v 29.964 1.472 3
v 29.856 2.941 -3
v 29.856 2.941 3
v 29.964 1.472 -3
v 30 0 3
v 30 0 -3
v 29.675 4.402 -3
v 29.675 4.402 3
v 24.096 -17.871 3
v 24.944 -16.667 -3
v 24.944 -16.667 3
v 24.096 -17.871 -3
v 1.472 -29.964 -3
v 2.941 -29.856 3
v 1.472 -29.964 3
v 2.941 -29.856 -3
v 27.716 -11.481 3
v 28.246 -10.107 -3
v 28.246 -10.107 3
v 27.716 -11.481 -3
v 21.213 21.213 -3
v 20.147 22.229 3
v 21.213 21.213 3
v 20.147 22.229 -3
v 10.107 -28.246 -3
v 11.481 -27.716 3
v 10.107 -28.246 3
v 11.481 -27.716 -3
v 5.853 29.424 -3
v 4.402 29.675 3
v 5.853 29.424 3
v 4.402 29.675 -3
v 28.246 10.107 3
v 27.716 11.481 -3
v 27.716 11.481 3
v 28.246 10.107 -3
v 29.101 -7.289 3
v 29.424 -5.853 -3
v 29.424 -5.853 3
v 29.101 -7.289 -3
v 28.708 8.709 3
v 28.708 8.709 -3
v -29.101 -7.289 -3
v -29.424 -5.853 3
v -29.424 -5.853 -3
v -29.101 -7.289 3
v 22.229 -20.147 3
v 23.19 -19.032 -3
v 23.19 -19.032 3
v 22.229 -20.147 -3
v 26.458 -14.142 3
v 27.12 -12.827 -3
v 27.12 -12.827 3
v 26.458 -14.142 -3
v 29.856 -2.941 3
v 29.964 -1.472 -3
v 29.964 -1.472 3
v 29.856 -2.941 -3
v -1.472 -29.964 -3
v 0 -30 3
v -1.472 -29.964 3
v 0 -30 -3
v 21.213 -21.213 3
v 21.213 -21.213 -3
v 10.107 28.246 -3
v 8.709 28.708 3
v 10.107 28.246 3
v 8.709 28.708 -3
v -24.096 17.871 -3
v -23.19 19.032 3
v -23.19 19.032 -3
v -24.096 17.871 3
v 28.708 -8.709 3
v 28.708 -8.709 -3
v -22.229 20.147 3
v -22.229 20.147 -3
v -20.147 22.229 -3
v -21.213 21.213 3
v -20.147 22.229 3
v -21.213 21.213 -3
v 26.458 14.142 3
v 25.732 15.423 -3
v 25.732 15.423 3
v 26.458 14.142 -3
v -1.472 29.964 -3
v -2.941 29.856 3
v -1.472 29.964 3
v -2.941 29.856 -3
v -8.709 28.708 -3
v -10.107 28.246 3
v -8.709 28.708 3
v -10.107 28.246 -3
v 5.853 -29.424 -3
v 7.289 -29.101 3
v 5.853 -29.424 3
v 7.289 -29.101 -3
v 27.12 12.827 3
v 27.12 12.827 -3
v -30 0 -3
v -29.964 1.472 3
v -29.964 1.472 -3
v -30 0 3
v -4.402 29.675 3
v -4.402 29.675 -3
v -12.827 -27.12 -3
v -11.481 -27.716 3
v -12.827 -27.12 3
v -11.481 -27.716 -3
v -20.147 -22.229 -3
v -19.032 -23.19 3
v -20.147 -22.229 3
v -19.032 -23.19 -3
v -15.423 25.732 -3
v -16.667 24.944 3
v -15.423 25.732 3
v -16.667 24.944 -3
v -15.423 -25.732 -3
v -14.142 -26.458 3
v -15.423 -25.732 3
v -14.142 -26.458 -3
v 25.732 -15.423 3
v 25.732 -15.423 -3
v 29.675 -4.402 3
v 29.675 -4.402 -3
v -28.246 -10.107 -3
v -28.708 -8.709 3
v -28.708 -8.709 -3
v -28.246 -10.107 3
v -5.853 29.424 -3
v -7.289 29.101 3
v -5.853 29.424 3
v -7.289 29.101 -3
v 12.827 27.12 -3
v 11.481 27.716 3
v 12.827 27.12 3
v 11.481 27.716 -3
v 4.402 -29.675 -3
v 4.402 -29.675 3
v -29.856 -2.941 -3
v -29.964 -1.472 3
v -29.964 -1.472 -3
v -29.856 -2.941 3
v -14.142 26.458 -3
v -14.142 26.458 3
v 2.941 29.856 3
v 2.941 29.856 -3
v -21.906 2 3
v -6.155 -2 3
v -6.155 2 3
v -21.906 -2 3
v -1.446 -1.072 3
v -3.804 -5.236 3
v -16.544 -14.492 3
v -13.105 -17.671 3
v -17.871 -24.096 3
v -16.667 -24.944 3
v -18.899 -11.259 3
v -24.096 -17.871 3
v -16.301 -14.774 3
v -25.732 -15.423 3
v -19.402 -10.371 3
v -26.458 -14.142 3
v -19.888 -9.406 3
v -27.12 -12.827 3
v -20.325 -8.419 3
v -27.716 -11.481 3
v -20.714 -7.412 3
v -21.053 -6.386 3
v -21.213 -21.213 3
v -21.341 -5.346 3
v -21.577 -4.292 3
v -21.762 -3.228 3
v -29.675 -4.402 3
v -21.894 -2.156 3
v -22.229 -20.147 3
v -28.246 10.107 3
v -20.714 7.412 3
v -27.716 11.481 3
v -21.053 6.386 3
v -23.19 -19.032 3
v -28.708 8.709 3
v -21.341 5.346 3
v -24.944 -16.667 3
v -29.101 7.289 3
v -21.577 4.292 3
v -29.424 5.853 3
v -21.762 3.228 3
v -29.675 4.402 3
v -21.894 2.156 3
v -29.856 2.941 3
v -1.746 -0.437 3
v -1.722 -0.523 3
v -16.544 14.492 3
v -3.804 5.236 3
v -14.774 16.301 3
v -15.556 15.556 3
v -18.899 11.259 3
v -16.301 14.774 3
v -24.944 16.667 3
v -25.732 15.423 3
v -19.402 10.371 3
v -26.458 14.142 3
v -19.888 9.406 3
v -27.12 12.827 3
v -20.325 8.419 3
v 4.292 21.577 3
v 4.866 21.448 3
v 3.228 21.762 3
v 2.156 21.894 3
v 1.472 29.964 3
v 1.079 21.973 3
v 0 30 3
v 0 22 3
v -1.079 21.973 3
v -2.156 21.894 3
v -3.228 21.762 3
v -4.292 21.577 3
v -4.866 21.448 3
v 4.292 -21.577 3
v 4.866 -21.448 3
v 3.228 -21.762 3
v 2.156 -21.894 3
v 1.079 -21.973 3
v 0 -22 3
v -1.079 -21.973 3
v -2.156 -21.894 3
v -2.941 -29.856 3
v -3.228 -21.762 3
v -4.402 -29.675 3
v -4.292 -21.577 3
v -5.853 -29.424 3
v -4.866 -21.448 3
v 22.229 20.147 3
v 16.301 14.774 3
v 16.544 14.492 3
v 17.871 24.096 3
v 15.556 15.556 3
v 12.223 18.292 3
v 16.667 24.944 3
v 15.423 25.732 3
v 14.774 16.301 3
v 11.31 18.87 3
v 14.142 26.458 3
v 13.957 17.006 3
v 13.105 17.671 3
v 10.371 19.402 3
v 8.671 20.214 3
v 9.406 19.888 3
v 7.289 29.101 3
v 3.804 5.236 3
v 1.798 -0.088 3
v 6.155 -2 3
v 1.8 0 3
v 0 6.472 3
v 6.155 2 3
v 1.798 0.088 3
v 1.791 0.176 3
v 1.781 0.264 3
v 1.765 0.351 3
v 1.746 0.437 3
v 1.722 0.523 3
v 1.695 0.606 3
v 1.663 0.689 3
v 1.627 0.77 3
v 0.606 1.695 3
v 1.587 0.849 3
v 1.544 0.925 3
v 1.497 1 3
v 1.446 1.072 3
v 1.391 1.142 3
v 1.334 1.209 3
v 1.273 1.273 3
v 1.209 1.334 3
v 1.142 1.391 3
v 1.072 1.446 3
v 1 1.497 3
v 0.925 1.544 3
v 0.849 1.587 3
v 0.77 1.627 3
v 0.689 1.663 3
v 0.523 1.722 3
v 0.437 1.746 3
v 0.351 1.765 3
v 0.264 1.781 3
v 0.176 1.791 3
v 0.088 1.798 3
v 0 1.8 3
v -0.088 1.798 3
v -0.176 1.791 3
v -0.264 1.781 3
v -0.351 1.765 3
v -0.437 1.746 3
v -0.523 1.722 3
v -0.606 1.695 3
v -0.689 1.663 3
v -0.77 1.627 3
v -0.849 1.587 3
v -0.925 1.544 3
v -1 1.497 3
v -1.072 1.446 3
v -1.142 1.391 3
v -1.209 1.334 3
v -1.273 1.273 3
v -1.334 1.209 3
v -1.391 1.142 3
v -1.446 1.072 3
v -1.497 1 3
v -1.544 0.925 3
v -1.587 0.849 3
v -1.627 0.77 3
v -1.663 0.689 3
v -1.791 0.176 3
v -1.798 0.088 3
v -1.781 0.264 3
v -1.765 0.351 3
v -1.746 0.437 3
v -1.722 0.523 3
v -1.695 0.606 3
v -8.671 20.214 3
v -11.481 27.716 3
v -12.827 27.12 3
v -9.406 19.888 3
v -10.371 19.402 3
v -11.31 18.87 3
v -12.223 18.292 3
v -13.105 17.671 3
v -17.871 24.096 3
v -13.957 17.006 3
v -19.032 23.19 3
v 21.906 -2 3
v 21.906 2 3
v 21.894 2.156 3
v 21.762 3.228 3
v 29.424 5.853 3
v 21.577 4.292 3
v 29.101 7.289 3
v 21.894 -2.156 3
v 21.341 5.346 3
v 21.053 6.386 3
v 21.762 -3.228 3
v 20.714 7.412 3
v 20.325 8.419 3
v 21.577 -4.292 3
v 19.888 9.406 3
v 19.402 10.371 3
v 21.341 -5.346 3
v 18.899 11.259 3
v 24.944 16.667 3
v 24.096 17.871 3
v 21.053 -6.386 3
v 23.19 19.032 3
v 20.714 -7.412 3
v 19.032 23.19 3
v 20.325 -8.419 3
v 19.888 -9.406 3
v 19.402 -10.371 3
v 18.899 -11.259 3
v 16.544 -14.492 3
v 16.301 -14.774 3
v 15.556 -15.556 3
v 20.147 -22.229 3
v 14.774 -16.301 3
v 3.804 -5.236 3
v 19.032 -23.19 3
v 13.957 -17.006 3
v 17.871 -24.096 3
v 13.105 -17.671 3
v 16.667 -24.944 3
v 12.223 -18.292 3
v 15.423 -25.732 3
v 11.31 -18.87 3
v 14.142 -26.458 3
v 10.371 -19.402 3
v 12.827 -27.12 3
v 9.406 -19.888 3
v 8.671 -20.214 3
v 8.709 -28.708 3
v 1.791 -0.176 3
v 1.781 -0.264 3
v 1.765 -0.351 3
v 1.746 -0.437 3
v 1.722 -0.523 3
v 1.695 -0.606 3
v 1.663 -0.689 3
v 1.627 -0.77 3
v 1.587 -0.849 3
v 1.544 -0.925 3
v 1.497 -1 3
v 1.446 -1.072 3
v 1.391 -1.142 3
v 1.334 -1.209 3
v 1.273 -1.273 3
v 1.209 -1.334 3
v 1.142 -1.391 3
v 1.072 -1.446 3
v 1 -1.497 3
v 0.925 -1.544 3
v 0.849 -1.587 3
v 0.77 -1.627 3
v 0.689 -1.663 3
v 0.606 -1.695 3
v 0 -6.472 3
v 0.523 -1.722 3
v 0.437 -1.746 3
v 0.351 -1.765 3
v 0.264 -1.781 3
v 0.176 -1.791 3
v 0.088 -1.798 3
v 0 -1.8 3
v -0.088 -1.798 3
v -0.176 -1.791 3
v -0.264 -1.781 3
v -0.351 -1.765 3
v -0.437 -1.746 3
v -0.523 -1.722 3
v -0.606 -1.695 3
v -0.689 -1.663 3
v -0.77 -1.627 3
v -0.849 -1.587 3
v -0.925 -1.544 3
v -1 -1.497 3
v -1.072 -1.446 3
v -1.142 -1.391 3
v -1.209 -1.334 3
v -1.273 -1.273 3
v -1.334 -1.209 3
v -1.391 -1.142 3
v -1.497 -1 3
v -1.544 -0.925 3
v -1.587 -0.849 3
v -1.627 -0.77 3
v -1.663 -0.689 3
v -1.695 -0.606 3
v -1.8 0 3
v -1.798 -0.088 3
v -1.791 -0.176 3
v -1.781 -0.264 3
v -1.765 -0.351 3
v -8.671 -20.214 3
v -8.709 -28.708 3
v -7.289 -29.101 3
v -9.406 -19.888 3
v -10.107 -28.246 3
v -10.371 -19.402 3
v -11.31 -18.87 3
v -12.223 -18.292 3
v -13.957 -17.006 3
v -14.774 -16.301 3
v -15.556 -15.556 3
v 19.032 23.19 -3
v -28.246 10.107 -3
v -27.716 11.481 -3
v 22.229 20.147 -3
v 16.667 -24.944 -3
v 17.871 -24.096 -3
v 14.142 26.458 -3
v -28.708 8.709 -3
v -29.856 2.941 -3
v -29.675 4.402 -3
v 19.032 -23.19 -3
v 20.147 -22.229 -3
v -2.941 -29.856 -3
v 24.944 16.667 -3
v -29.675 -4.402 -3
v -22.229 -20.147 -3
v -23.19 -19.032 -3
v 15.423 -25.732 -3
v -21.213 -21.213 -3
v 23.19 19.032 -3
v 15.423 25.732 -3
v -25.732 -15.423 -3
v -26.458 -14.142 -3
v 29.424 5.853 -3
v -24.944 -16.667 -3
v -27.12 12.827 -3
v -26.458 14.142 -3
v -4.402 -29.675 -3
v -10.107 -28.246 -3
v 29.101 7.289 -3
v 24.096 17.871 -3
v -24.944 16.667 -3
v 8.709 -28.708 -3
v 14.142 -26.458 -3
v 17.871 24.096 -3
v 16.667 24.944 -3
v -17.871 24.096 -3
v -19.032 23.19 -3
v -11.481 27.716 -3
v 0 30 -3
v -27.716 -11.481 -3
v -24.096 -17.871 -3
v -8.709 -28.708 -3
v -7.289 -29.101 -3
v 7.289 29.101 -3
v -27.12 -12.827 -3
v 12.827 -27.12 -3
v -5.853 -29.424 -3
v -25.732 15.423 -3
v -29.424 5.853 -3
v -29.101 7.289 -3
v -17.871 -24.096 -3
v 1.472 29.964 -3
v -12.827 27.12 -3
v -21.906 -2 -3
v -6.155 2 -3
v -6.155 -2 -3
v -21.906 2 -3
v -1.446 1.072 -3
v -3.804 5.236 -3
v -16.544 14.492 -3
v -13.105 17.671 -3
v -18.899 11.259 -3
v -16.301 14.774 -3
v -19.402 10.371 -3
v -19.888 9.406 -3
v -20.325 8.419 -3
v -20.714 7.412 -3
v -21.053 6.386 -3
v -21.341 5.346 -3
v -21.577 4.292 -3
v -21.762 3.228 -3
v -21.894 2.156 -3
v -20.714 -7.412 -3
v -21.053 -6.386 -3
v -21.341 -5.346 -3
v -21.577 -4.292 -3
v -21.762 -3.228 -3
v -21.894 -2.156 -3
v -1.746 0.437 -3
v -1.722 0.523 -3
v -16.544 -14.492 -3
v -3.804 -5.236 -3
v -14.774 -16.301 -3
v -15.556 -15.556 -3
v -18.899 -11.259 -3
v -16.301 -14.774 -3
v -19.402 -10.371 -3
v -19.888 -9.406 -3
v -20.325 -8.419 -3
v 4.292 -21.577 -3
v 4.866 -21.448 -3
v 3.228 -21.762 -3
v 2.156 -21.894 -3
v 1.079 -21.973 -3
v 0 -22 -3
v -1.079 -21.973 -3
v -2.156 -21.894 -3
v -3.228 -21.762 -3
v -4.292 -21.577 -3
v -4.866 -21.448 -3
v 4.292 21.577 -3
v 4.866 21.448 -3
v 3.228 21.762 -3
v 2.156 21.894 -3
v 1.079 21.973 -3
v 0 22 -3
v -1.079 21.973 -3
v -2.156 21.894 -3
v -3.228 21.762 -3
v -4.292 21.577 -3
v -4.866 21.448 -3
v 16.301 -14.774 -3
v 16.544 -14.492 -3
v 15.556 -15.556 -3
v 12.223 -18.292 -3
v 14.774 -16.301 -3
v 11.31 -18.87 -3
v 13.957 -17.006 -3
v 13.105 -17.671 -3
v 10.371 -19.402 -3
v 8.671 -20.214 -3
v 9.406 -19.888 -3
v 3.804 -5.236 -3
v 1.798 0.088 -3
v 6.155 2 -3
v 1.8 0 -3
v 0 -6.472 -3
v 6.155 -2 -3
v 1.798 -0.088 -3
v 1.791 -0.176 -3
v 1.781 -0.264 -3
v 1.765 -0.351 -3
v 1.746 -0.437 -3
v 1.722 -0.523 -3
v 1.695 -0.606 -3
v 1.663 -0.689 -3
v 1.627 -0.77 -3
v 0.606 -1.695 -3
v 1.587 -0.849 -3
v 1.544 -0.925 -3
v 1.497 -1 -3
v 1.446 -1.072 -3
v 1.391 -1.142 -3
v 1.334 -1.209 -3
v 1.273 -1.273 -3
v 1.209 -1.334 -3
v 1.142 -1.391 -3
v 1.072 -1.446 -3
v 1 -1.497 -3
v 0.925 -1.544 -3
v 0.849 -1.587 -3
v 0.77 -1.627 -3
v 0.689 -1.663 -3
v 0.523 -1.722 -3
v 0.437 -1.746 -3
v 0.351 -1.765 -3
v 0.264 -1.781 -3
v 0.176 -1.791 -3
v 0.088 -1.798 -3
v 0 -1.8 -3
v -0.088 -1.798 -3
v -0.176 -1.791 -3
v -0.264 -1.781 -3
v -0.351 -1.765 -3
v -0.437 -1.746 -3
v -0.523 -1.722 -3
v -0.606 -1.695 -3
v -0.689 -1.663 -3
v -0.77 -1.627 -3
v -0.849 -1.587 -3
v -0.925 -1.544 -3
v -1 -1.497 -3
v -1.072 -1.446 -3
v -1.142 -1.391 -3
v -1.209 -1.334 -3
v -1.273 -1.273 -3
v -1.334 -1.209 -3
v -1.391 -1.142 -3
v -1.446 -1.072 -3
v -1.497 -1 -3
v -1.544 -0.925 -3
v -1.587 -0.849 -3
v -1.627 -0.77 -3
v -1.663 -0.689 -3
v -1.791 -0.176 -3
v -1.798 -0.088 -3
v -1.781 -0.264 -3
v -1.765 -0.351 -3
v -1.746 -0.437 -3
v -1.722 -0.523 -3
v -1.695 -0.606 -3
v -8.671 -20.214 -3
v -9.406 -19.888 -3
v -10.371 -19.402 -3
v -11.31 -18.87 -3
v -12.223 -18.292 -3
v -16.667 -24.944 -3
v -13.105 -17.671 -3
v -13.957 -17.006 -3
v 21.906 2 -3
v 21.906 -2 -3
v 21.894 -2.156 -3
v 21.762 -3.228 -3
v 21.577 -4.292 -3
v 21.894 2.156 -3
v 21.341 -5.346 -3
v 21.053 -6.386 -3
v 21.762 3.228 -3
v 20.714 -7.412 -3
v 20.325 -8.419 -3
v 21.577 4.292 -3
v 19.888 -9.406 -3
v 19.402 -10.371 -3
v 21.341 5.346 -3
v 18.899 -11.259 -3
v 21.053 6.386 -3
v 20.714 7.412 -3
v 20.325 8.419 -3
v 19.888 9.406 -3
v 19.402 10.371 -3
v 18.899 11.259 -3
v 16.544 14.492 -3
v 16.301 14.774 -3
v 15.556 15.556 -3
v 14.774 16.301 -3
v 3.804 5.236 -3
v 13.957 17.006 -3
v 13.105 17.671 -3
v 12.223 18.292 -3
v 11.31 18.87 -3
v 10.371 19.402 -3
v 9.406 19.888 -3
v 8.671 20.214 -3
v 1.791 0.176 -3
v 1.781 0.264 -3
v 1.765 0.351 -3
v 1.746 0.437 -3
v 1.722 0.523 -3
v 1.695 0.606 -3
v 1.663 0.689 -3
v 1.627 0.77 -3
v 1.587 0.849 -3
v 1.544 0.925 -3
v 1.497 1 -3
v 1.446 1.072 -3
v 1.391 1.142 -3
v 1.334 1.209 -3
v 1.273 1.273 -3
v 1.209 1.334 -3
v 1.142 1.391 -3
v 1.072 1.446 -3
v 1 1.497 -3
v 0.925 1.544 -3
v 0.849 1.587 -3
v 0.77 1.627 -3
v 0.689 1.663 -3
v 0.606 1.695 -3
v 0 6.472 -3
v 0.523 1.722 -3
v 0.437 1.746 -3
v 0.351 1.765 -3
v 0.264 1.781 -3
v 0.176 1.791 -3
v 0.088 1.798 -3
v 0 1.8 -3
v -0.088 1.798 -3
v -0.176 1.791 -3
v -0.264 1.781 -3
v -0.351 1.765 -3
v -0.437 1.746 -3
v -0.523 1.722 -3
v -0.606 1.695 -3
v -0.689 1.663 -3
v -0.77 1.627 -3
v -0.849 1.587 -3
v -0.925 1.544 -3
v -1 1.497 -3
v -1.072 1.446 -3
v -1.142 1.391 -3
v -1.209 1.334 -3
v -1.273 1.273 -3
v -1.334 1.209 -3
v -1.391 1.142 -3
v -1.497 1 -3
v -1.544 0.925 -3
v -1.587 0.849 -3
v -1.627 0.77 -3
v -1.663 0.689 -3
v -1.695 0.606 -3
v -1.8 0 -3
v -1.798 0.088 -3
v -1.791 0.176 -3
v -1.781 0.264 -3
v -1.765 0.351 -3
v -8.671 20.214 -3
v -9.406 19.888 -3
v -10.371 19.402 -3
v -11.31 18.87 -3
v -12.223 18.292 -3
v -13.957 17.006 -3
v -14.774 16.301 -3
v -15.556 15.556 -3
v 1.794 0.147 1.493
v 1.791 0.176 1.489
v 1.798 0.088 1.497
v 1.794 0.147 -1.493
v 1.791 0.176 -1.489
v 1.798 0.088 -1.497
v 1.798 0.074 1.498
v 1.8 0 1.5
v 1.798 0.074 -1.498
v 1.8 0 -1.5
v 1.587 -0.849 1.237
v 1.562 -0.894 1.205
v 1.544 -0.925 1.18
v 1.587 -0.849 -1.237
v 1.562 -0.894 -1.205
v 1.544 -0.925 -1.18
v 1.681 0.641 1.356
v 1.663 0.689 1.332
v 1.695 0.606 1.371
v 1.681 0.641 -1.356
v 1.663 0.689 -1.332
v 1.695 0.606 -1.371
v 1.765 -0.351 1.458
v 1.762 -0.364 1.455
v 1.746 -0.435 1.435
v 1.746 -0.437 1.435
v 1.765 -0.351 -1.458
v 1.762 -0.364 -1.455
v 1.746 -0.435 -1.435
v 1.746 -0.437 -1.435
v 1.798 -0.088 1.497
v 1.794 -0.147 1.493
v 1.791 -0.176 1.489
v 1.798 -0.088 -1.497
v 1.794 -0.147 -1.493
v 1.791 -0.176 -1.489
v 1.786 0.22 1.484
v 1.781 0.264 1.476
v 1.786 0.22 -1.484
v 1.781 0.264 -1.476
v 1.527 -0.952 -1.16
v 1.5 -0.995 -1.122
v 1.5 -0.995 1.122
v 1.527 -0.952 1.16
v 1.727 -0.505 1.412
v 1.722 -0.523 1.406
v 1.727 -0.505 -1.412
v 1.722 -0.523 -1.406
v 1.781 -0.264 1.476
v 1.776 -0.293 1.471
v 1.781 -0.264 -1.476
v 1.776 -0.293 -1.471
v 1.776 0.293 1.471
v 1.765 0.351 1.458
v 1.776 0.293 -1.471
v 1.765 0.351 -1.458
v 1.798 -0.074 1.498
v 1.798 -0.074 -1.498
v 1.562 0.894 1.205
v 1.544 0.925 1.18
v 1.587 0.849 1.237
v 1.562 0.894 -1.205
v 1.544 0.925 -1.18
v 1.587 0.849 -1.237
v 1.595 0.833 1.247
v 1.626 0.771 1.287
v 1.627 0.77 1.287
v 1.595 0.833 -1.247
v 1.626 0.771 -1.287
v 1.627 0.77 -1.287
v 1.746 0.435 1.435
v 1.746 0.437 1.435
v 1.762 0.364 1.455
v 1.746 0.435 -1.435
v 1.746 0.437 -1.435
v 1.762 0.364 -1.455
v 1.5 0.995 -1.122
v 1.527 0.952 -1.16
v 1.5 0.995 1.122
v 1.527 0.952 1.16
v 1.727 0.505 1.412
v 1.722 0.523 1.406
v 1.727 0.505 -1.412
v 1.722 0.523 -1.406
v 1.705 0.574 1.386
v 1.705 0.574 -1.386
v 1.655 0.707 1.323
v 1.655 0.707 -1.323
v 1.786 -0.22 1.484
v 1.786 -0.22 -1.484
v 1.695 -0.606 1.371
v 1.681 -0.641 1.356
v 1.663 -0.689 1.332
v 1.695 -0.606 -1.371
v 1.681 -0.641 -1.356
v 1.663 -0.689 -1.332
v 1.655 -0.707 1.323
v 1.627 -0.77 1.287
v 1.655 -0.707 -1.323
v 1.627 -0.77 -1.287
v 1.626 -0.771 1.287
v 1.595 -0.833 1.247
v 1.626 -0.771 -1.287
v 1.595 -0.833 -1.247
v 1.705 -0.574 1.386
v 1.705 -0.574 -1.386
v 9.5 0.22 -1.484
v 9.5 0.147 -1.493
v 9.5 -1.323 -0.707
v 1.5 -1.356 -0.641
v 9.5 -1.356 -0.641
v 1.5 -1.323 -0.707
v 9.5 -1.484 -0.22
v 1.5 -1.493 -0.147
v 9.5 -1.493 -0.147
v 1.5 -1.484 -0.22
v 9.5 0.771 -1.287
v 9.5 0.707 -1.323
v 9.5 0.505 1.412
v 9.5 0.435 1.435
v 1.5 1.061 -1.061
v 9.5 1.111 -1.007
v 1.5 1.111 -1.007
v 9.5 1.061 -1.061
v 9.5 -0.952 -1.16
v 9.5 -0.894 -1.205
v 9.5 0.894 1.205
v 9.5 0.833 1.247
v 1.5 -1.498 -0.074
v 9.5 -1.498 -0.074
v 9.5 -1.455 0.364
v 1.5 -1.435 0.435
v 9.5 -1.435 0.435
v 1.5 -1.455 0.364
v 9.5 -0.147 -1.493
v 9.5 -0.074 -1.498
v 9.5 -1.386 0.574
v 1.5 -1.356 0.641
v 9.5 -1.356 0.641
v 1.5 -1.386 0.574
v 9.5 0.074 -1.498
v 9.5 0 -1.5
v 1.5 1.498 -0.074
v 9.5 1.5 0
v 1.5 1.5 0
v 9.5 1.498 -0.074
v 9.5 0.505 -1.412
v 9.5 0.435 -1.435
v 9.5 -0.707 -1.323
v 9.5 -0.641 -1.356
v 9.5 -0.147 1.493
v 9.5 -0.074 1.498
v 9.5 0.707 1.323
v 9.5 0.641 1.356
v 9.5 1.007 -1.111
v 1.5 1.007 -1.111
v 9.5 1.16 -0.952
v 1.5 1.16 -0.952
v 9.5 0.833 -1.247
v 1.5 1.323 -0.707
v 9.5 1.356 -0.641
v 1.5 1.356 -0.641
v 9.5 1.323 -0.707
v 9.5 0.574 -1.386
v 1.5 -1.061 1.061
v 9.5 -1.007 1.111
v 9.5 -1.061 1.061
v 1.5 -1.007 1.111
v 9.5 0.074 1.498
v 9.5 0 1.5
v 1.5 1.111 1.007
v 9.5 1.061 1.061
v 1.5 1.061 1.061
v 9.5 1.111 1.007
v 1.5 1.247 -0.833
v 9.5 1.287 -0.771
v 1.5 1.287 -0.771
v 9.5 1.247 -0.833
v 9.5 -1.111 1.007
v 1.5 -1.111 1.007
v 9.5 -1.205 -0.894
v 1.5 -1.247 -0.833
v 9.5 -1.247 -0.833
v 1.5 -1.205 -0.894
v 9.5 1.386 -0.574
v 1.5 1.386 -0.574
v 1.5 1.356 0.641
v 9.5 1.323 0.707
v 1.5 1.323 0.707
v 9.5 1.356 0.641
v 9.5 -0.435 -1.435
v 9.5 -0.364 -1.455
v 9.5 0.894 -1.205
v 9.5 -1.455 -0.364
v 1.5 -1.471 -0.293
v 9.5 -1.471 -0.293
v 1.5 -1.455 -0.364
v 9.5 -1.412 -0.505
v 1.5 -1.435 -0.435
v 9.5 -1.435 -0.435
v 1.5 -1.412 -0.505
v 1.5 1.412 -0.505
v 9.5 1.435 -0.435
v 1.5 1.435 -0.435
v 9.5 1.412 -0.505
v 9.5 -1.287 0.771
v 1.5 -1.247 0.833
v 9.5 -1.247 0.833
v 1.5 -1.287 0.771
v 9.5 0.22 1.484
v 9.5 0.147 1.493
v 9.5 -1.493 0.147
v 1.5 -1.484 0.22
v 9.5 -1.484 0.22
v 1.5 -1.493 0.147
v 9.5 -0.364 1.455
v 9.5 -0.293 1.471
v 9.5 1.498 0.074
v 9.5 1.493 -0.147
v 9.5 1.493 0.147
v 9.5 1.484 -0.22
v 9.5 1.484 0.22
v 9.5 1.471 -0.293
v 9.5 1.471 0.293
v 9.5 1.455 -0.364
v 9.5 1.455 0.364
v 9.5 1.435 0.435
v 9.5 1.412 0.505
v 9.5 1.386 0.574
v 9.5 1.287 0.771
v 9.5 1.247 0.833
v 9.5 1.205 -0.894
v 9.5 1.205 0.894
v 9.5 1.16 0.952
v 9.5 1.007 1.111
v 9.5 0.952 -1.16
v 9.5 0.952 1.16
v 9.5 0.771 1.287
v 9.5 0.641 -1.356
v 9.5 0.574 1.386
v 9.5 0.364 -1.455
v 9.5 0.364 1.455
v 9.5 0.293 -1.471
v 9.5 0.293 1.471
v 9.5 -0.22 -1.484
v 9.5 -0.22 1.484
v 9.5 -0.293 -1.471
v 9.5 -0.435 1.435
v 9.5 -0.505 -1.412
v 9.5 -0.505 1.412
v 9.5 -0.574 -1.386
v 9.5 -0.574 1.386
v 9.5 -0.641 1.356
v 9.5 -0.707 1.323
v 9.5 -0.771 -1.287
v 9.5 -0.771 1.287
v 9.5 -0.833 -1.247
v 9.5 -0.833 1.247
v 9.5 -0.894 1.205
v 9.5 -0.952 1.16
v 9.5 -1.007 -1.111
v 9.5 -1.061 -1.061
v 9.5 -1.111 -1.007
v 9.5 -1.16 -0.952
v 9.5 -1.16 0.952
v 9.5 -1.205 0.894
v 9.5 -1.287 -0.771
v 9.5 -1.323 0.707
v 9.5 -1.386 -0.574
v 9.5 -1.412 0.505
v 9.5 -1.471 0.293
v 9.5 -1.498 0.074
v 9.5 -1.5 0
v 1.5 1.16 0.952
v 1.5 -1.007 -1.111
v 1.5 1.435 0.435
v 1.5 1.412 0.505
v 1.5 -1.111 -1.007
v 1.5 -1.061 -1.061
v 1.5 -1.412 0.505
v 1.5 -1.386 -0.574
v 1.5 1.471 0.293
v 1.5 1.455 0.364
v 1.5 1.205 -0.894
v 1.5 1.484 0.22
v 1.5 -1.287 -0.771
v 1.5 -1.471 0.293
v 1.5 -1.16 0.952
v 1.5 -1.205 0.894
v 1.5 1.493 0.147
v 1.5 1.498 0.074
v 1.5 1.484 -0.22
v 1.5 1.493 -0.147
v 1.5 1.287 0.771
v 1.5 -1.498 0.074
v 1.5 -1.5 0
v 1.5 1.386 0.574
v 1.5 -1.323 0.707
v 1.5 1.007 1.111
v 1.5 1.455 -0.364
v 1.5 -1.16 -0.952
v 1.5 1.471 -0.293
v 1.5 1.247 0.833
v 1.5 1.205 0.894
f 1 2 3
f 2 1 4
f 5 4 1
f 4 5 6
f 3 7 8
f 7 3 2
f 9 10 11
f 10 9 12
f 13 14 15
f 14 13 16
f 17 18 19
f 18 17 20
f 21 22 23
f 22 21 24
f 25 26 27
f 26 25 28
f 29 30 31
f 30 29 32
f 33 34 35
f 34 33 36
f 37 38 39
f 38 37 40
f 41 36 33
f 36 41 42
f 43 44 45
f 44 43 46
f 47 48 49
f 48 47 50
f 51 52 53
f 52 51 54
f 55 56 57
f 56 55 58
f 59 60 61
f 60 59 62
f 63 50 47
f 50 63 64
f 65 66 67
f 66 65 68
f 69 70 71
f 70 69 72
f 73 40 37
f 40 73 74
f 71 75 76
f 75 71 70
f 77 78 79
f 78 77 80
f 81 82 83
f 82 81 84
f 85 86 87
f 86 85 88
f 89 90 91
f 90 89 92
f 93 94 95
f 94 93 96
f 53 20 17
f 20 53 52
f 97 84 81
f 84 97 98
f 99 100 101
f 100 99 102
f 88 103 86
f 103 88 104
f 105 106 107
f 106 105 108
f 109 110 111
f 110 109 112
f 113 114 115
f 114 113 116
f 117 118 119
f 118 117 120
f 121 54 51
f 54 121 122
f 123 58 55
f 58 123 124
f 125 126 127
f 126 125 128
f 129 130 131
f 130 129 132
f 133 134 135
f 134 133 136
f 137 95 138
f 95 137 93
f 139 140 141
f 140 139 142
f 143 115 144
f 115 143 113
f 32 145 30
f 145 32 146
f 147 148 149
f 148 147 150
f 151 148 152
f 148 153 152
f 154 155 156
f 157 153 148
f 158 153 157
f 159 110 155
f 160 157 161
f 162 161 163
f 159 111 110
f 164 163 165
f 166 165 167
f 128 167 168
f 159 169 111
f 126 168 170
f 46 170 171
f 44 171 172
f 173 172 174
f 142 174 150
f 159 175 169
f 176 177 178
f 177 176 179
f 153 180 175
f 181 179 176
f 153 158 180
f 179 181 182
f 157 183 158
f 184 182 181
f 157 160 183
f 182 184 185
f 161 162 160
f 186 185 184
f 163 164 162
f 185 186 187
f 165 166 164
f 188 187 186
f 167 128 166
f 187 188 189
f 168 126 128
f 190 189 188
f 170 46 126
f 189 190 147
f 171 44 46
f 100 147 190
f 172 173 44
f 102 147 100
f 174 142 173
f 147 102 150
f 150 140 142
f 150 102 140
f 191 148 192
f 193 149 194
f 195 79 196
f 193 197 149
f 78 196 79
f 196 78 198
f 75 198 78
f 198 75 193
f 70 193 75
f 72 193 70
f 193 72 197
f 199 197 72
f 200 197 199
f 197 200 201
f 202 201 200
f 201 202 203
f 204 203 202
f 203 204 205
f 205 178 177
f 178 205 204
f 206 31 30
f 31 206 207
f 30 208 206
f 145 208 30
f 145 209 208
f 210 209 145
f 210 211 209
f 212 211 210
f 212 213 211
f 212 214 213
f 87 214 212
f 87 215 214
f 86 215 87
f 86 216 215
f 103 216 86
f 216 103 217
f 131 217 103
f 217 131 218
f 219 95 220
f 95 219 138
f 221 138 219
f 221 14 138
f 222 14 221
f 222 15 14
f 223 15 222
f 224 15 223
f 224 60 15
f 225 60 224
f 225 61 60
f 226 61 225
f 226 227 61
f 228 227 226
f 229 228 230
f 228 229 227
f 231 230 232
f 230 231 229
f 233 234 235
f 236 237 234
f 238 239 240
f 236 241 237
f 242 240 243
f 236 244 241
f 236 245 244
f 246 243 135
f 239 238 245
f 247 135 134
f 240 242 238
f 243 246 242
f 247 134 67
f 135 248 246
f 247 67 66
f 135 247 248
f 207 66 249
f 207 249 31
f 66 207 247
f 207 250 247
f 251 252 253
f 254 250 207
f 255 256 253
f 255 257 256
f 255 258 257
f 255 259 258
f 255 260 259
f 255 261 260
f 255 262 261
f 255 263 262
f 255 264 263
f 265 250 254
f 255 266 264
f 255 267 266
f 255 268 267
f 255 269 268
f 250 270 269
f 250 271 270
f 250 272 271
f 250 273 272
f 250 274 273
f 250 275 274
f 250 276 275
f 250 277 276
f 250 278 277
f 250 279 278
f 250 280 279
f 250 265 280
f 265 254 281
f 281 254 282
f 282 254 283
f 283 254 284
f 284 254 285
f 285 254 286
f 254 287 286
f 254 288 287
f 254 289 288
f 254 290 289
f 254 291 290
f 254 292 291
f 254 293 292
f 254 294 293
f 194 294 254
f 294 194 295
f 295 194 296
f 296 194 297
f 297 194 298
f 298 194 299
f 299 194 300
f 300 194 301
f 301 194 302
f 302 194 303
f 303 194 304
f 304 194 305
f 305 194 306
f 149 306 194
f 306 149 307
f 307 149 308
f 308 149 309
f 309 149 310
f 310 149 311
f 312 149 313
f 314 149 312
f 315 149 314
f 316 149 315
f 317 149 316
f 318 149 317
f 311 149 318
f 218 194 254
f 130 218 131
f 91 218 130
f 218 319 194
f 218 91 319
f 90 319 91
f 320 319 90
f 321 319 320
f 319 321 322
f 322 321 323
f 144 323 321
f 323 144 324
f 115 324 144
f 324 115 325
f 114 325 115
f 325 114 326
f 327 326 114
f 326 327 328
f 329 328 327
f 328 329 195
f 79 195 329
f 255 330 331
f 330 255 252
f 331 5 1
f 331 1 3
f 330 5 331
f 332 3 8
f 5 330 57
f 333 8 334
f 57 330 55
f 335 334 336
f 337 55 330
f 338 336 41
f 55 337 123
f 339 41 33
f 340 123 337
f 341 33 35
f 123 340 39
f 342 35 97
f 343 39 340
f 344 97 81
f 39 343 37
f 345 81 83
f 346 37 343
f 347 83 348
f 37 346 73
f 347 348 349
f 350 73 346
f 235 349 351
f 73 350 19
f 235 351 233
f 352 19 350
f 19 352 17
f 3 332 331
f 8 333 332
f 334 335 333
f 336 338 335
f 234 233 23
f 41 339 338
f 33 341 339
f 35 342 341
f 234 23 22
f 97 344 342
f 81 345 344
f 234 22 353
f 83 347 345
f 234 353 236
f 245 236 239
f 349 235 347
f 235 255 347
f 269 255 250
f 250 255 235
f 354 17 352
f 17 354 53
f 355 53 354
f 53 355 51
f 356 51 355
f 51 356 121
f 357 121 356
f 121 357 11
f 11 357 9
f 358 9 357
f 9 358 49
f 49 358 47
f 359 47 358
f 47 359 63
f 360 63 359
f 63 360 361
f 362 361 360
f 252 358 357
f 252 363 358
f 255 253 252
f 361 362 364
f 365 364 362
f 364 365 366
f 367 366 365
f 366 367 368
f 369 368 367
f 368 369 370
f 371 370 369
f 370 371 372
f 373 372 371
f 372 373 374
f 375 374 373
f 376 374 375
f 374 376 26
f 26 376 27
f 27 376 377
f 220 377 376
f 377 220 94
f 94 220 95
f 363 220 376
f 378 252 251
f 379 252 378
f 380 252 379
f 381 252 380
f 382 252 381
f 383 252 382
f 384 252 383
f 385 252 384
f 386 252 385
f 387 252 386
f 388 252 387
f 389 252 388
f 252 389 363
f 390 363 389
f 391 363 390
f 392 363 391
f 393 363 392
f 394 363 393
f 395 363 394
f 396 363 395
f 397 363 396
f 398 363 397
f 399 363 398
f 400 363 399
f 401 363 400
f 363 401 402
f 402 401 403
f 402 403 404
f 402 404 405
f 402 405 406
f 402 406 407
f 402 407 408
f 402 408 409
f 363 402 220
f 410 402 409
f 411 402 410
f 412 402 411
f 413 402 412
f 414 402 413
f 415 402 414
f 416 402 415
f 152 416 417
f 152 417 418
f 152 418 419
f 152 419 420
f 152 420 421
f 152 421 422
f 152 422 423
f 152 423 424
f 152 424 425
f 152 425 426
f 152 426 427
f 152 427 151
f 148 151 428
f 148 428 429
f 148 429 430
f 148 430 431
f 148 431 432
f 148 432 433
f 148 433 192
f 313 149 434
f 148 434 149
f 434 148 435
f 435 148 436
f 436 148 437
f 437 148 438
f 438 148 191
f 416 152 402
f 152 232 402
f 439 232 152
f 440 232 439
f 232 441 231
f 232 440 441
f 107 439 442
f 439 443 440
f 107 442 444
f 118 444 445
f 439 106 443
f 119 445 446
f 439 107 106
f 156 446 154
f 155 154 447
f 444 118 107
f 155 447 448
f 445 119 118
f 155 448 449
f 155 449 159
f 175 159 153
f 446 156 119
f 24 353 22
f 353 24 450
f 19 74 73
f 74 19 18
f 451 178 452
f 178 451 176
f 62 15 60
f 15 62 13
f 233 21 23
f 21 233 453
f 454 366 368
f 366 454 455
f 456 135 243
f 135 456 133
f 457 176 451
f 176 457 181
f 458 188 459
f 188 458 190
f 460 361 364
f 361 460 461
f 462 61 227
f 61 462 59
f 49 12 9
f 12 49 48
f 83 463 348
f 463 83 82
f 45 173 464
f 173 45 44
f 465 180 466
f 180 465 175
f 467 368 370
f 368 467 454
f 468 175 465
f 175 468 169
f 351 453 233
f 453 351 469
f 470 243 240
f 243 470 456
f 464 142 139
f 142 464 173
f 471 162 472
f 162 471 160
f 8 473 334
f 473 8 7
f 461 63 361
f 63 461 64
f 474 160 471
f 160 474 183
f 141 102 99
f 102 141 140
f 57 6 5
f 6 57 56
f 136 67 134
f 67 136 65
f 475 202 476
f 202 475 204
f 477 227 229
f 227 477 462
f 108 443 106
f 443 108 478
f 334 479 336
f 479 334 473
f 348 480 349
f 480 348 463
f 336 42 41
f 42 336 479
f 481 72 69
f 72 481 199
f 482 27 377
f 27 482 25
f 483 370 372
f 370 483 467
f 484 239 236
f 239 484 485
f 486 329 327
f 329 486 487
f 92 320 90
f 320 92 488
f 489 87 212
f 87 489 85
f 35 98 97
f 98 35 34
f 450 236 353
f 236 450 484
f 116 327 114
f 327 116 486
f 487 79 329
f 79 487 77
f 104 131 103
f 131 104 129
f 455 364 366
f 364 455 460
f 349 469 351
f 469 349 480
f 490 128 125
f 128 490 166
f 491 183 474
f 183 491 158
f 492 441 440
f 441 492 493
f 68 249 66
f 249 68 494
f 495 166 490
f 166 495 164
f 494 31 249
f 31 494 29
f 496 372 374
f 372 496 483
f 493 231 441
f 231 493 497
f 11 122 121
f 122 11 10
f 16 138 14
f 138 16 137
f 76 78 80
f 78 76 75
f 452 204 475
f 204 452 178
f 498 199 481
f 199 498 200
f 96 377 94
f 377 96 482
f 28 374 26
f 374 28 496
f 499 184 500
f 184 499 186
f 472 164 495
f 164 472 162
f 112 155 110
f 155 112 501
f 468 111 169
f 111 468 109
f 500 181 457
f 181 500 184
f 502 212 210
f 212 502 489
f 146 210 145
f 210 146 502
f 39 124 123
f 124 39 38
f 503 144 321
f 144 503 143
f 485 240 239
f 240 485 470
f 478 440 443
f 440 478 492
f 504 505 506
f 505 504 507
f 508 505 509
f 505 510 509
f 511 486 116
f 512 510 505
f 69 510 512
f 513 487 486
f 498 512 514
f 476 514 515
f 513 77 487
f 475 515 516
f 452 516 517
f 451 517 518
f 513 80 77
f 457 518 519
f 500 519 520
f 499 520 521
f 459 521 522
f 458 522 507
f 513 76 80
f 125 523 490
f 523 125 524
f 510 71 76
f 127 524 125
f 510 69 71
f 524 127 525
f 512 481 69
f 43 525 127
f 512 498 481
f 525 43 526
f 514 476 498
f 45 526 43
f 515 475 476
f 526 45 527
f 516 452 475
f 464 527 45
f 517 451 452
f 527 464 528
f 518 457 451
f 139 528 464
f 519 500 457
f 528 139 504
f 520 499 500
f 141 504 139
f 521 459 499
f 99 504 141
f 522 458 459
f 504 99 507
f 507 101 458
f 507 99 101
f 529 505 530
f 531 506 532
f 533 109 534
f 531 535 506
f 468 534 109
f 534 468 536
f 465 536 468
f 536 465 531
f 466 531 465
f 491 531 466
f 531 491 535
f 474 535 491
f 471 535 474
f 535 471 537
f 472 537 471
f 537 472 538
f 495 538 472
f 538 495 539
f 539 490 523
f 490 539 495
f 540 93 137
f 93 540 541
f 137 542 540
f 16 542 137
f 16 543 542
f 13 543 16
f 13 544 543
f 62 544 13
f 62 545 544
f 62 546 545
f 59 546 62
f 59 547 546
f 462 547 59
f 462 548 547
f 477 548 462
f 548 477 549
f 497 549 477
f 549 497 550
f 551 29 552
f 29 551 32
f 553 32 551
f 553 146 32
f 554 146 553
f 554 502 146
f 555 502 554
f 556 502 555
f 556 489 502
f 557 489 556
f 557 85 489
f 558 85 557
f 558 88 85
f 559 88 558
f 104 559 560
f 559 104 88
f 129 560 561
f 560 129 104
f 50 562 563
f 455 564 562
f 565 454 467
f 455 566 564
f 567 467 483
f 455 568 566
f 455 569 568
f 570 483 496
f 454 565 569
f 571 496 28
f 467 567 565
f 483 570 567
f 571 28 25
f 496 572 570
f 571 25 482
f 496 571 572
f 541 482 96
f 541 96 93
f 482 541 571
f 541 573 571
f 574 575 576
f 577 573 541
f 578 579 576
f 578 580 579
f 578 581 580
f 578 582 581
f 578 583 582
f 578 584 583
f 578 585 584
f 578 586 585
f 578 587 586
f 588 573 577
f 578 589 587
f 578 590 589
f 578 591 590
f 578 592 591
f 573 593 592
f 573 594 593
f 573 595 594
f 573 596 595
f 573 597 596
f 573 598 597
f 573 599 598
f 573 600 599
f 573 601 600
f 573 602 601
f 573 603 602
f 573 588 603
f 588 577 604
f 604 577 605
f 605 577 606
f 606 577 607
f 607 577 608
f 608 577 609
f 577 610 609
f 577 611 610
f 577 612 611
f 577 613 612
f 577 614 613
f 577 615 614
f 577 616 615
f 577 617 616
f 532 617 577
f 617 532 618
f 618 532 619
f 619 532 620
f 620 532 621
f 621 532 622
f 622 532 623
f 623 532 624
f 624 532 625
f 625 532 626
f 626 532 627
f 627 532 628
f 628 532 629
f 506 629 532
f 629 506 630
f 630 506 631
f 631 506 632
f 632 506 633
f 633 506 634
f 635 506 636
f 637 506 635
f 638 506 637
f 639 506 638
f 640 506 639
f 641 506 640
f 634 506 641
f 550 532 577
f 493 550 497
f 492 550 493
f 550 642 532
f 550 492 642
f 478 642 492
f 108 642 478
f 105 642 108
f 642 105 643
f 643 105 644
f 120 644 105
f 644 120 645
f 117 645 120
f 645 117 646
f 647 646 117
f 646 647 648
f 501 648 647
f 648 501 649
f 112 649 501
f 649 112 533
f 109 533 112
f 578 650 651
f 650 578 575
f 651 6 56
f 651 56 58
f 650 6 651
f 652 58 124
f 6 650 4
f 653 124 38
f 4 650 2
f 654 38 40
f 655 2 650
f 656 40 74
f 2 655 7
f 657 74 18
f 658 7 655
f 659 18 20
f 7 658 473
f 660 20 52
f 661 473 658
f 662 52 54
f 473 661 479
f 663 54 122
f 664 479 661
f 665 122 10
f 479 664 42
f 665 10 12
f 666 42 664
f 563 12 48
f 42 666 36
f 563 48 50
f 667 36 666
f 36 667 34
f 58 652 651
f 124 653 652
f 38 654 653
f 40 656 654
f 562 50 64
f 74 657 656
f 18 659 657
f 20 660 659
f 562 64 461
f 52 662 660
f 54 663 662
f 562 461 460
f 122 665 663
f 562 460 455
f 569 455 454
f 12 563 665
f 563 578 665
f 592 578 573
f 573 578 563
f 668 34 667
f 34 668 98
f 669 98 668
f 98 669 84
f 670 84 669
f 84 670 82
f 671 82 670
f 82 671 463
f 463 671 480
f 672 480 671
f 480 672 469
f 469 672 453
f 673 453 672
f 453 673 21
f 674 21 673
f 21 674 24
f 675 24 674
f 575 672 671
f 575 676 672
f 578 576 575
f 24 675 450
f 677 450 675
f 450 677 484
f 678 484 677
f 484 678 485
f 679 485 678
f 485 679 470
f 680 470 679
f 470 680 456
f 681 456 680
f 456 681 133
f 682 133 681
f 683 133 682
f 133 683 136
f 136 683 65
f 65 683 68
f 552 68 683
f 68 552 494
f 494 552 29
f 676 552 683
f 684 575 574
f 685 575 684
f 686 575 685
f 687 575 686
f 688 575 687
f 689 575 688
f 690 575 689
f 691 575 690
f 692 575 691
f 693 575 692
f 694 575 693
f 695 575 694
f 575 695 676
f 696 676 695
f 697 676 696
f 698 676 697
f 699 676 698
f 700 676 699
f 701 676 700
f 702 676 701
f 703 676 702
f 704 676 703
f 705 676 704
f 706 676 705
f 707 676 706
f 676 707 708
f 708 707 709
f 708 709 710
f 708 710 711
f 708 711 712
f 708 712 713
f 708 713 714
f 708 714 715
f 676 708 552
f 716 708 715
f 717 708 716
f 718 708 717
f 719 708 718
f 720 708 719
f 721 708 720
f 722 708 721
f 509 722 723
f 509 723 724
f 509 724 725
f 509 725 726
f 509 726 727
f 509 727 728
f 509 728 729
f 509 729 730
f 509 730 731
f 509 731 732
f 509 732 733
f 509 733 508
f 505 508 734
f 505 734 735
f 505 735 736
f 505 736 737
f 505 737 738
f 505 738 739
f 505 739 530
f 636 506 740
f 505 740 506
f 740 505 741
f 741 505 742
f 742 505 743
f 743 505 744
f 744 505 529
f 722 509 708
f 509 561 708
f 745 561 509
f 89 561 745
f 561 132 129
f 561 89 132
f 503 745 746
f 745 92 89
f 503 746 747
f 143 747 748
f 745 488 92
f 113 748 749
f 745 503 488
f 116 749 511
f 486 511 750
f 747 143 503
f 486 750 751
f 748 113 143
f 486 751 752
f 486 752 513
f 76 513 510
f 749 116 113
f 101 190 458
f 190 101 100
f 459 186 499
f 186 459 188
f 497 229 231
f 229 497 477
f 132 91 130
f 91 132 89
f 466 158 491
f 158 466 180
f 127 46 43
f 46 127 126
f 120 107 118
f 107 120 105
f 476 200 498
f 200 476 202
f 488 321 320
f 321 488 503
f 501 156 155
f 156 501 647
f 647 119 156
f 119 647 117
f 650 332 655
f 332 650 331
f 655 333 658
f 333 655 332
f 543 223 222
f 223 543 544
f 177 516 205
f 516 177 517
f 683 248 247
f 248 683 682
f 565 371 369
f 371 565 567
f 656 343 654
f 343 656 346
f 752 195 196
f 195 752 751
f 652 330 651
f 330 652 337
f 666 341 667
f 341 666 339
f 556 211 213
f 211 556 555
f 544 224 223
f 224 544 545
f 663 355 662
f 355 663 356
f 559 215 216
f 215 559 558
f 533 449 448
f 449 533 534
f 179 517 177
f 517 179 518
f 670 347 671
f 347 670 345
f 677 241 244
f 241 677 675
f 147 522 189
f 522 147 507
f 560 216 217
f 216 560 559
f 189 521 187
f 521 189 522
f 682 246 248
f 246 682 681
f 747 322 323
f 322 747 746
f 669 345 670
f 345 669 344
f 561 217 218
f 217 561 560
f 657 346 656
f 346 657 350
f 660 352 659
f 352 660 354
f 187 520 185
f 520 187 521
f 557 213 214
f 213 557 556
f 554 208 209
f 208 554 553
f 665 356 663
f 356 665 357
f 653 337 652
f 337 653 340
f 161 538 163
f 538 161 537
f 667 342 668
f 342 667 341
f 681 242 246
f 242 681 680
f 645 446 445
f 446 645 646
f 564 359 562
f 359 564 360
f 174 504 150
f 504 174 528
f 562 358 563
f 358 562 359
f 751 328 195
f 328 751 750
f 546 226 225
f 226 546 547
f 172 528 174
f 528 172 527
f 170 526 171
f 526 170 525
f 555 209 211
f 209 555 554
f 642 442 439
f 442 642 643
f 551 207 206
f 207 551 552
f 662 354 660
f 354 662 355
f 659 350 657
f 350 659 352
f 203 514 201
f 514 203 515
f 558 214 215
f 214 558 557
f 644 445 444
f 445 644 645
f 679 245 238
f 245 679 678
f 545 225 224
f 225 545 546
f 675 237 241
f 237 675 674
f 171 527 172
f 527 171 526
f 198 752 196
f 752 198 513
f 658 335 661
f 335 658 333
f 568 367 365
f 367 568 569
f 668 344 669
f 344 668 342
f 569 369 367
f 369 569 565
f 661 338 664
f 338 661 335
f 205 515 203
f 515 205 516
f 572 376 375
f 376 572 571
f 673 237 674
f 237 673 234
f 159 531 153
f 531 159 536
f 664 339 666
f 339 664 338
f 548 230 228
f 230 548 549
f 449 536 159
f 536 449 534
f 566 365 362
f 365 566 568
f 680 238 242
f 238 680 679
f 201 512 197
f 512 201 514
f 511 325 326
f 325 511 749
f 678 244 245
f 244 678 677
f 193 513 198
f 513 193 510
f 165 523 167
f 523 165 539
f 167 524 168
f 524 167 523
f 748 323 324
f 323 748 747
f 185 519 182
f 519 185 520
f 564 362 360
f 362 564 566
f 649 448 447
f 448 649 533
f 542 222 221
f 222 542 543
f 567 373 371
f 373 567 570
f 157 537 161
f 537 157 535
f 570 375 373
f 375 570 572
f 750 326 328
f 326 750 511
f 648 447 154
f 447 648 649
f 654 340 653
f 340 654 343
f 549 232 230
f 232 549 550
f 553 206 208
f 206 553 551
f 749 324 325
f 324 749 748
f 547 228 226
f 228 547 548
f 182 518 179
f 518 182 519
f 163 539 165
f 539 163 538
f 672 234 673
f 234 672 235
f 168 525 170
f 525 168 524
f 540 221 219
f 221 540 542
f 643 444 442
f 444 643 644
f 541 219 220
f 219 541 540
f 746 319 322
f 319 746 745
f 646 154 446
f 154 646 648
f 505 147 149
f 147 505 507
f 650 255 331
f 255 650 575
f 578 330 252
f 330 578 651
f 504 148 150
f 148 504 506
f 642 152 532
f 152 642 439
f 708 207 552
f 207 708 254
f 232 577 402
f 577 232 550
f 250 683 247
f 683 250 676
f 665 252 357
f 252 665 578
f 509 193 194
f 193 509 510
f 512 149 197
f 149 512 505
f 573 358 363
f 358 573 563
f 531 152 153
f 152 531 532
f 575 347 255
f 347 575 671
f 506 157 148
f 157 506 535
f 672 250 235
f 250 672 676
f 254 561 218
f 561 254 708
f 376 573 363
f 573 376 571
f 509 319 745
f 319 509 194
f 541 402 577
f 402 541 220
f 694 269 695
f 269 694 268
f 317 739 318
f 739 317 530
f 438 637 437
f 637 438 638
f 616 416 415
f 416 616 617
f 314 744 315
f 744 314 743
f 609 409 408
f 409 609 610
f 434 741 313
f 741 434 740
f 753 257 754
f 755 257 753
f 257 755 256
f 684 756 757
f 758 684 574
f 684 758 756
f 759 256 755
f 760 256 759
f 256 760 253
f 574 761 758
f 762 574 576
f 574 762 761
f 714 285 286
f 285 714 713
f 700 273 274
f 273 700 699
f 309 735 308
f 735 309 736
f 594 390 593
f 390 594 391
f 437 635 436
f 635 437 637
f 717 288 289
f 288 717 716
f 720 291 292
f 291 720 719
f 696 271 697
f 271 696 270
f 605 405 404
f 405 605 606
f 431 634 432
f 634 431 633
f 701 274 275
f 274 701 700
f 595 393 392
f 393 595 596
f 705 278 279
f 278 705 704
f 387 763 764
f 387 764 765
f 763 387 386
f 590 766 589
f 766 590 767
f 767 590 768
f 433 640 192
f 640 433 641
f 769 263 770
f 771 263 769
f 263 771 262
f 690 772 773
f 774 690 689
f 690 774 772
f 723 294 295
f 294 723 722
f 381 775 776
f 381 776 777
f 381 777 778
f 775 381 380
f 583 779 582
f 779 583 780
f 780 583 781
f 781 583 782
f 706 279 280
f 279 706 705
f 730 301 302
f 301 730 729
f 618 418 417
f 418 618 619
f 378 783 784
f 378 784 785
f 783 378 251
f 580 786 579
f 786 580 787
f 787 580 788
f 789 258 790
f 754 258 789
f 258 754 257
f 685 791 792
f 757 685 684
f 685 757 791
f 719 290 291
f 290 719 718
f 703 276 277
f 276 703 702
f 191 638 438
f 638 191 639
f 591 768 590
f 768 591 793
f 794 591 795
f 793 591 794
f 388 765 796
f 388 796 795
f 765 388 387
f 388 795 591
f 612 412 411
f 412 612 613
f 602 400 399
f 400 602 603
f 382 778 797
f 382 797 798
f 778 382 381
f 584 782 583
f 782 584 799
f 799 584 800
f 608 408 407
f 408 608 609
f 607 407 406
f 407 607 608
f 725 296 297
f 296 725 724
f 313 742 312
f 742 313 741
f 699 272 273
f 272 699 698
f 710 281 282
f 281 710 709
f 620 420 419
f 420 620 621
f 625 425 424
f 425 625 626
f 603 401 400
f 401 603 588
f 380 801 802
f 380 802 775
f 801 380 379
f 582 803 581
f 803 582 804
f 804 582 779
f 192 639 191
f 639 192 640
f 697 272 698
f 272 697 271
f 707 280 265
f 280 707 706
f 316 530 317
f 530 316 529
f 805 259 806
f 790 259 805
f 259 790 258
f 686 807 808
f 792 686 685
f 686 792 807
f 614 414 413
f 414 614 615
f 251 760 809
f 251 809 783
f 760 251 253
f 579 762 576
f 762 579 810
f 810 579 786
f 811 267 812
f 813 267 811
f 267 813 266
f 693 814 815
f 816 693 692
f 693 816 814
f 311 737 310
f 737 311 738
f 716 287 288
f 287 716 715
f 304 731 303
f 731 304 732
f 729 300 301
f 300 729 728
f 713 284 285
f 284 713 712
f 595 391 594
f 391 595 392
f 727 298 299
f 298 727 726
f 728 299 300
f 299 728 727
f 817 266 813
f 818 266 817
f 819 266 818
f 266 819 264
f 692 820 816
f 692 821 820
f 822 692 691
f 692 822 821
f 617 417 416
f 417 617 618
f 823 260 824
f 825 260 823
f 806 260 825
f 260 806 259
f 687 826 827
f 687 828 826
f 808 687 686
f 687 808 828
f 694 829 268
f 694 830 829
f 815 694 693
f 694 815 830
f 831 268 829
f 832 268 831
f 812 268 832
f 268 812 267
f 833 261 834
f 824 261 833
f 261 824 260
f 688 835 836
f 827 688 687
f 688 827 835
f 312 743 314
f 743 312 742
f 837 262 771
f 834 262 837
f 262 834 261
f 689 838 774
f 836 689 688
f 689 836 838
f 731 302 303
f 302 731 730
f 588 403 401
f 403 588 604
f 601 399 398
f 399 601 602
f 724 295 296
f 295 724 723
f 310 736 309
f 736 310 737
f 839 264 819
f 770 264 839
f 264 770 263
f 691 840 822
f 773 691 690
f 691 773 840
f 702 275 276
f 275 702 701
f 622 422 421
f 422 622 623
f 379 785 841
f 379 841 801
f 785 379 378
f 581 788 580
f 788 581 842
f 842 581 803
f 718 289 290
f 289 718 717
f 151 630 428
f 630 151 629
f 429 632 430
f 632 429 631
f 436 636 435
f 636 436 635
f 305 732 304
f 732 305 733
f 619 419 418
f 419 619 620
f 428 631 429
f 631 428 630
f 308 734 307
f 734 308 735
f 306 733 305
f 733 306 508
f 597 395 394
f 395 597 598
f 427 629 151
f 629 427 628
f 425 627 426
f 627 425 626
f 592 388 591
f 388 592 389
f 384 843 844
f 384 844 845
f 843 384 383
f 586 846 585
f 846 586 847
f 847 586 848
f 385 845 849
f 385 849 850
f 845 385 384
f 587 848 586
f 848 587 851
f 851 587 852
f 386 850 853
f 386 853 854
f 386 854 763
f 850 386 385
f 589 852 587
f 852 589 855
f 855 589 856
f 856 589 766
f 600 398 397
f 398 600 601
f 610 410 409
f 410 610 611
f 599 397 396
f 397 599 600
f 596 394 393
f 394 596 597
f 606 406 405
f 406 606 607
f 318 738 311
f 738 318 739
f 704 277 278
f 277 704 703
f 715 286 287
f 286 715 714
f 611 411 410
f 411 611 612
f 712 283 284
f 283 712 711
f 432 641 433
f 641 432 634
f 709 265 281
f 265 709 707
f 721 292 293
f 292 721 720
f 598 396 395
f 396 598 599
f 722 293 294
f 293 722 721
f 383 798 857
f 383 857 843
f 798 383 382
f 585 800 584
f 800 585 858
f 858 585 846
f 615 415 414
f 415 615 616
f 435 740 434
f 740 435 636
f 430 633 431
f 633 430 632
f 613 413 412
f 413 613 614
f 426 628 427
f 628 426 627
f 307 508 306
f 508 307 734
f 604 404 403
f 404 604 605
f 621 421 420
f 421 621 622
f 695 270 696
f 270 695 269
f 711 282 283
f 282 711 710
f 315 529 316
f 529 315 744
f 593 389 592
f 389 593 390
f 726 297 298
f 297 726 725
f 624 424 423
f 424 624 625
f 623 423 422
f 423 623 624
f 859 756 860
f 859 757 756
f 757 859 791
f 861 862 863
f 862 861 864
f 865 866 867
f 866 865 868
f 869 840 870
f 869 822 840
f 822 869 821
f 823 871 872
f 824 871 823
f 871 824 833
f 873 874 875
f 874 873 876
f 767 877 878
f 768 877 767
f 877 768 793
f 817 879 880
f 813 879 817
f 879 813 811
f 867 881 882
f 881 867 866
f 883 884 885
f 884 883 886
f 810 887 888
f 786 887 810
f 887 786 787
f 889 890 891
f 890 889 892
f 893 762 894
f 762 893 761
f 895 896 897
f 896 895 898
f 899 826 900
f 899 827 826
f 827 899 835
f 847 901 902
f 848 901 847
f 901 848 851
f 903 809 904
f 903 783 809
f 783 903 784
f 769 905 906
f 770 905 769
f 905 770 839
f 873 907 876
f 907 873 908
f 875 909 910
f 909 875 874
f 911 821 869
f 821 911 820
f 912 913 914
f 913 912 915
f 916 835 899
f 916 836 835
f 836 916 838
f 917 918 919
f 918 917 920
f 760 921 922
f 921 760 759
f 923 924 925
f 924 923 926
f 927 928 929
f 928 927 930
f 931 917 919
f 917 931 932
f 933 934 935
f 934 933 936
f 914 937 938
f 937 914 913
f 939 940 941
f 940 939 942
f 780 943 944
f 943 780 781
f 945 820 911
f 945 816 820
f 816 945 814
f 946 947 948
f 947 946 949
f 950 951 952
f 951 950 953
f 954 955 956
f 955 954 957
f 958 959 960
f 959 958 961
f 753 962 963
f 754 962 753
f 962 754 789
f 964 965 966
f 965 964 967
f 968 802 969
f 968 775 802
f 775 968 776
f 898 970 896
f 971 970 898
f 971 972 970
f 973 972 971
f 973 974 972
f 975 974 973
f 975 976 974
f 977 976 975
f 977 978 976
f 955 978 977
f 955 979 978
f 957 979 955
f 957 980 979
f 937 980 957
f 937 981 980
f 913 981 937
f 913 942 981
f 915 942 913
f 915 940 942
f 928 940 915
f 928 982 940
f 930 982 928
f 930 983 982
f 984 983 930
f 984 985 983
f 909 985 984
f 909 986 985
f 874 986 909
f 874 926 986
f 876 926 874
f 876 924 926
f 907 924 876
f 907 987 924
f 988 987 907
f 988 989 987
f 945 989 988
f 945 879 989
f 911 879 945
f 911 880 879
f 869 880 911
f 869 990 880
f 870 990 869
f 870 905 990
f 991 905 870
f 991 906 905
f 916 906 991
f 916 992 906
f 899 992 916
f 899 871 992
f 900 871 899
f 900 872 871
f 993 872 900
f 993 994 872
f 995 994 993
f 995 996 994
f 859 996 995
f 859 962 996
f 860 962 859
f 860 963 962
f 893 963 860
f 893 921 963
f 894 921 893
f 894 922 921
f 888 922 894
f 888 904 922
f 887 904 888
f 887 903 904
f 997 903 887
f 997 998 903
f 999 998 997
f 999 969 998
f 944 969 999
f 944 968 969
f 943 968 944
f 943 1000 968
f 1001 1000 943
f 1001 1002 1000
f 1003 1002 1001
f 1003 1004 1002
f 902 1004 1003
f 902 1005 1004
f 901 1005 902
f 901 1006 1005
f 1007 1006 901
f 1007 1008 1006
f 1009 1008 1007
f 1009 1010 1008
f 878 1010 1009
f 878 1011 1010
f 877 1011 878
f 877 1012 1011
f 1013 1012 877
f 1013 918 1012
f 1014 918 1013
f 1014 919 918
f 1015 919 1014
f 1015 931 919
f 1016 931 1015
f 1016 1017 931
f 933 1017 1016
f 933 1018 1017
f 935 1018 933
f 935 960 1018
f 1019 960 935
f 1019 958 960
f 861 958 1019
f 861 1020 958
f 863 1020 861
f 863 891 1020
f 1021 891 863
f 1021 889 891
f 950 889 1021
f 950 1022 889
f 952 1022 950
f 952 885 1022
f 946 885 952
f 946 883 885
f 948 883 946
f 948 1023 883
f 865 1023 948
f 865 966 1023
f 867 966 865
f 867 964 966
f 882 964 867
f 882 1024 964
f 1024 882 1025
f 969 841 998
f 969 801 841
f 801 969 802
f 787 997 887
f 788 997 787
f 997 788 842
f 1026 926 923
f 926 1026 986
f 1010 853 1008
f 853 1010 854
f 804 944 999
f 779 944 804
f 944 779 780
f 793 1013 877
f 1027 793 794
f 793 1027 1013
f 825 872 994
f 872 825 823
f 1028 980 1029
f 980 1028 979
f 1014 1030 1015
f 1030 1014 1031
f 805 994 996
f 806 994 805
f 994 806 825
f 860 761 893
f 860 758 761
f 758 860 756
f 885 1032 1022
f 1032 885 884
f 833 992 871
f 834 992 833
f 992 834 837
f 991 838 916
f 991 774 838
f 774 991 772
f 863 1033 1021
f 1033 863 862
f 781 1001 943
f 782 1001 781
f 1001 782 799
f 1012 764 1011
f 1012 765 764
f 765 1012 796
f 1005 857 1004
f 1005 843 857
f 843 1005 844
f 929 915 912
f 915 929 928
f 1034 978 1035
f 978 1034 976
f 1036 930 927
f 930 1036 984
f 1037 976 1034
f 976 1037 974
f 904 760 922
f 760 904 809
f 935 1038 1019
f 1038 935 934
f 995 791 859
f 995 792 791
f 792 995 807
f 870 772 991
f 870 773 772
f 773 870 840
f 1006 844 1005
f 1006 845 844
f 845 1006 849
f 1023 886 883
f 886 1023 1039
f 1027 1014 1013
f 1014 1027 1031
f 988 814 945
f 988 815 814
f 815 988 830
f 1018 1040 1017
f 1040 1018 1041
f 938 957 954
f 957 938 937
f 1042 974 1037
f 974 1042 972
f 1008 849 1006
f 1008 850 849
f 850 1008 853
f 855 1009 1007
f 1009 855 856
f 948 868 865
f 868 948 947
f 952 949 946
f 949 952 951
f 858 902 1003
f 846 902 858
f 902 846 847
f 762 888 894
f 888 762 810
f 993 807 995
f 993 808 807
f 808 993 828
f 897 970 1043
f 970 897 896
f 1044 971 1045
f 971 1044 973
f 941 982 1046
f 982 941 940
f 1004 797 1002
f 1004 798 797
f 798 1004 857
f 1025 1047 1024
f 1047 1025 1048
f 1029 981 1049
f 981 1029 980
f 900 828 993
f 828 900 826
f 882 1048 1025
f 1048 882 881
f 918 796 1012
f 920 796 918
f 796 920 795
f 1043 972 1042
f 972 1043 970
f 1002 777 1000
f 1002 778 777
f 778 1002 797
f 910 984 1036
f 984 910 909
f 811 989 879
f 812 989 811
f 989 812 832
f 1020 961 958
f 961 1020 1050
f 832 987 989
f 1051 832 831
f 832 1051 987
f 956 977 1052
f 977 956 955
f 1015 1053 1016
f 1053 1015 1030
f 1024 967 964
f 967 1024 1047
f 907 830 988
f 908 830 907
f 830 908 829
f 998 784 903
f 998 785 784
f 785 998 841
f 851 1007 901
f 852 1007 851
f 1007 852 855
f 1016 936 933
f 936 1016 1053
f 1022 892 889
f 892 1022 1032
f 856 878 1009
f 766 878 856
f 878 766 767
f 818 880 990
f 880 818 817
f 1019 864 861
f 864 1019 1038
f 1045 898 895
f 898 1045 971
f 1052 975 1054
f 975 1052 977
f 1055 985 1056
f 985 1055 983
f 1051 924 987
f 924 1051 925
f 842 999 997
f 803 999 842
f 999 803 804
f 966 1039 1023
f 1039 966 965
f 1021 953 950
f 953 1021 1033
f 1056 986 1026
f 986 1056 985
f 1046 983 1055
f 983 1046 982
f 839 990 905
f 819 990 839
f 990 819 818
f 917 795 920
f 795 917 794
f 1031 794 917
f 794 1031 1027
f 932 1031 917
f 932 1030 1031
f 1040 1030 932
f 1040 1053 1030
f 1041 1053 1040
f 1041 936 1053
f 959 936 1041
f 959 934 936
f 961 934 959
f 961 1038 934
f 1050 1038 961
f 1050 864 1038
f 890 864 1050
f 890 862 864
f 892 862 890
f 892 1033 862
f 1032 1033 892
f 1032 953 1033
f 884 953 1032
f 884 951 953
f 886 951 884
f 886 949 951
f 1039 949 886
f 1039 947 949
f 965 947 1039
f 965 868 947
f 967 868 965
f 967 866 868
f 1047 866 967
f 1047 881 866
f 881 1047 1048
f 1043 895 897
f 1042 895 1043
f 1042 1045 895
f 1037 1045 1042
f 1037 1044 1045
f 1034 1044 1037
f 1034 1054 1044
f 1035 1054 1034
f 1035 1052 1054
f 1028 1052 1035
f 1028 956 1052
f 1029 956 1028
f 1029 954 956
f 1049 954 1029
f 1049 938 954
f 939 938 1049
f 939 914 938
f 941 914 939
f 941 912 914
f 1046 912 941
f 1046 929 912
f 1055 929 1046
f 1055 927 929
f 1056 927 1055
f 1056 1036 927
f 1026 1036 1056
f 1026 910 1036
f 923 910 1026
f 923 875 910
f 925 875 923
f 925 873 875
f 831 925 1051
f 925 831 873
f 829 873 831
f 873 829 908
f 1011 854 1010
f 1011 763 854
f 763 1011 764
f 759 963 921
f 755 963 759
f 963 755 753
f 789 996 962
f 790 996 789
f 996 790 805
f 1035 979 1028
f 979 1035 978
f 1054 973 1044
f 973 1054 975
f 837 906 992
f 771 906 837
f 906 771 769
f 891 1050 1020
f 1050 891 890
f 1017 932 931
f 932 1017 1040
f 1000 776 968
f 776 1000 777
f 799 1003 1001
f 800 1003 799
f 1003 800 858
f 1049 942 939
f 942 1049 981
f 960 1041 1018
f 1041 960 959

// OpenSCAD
// Self-Balancing Cube — Reaction Wheel
// Radius: 30.0mm, Thickness: 6.0mm
// Mass concentrated at rim for max rotational inertia
// Print: PETG, 80% infill at rim, 20% center
// No supports needed

$fn = 128;

wheel_r    = 30.0;
wheel_t    = 6.0;
hub_d      = 8.0;
shaft_d    = 3.4;
rim_w      = 8;          // rim width
spoke_w    = 4;          // spoke width
n_spokes   = 5;
set_screw_d= 3;          // M3 set screw

difference() {
    union() {
        // Outer rim — mass concentrated here for inertia
        difference() {
            cylinder(h=wheel_t, d=wheel_r*2, center=true);
            cylinder(h=wheel_t+1, d=(wheel_r-rim_w)*2, center=true);
        }

        // Hub
        cylinder(h=wheel_t, d=hub_d, center=true);

        // Spokes
        for (i = [0:n_spokes-1]) {
            rotate([0, 0, i * (360/n_spokes)])
                translate([0, 0, 0])
                    rotate([0, 0, 0])
                        cube([wheel_r*2 - rim_w, spoke_w, wheel_t], center=true);
        }
    }

    // Shaft bore (D-flat for grub screw)
    cylinder(h=wheel_t+2, d=shaft_d + 0.2, center=true);

    // Grub screw hole (M3, radial)
    translate([hub_d/2 + set_screw_d/2, 0, 0])
        rotate([0, 90, 0])
            cylinder(h=hub_d, d=set_screw_d, center=true);
}
